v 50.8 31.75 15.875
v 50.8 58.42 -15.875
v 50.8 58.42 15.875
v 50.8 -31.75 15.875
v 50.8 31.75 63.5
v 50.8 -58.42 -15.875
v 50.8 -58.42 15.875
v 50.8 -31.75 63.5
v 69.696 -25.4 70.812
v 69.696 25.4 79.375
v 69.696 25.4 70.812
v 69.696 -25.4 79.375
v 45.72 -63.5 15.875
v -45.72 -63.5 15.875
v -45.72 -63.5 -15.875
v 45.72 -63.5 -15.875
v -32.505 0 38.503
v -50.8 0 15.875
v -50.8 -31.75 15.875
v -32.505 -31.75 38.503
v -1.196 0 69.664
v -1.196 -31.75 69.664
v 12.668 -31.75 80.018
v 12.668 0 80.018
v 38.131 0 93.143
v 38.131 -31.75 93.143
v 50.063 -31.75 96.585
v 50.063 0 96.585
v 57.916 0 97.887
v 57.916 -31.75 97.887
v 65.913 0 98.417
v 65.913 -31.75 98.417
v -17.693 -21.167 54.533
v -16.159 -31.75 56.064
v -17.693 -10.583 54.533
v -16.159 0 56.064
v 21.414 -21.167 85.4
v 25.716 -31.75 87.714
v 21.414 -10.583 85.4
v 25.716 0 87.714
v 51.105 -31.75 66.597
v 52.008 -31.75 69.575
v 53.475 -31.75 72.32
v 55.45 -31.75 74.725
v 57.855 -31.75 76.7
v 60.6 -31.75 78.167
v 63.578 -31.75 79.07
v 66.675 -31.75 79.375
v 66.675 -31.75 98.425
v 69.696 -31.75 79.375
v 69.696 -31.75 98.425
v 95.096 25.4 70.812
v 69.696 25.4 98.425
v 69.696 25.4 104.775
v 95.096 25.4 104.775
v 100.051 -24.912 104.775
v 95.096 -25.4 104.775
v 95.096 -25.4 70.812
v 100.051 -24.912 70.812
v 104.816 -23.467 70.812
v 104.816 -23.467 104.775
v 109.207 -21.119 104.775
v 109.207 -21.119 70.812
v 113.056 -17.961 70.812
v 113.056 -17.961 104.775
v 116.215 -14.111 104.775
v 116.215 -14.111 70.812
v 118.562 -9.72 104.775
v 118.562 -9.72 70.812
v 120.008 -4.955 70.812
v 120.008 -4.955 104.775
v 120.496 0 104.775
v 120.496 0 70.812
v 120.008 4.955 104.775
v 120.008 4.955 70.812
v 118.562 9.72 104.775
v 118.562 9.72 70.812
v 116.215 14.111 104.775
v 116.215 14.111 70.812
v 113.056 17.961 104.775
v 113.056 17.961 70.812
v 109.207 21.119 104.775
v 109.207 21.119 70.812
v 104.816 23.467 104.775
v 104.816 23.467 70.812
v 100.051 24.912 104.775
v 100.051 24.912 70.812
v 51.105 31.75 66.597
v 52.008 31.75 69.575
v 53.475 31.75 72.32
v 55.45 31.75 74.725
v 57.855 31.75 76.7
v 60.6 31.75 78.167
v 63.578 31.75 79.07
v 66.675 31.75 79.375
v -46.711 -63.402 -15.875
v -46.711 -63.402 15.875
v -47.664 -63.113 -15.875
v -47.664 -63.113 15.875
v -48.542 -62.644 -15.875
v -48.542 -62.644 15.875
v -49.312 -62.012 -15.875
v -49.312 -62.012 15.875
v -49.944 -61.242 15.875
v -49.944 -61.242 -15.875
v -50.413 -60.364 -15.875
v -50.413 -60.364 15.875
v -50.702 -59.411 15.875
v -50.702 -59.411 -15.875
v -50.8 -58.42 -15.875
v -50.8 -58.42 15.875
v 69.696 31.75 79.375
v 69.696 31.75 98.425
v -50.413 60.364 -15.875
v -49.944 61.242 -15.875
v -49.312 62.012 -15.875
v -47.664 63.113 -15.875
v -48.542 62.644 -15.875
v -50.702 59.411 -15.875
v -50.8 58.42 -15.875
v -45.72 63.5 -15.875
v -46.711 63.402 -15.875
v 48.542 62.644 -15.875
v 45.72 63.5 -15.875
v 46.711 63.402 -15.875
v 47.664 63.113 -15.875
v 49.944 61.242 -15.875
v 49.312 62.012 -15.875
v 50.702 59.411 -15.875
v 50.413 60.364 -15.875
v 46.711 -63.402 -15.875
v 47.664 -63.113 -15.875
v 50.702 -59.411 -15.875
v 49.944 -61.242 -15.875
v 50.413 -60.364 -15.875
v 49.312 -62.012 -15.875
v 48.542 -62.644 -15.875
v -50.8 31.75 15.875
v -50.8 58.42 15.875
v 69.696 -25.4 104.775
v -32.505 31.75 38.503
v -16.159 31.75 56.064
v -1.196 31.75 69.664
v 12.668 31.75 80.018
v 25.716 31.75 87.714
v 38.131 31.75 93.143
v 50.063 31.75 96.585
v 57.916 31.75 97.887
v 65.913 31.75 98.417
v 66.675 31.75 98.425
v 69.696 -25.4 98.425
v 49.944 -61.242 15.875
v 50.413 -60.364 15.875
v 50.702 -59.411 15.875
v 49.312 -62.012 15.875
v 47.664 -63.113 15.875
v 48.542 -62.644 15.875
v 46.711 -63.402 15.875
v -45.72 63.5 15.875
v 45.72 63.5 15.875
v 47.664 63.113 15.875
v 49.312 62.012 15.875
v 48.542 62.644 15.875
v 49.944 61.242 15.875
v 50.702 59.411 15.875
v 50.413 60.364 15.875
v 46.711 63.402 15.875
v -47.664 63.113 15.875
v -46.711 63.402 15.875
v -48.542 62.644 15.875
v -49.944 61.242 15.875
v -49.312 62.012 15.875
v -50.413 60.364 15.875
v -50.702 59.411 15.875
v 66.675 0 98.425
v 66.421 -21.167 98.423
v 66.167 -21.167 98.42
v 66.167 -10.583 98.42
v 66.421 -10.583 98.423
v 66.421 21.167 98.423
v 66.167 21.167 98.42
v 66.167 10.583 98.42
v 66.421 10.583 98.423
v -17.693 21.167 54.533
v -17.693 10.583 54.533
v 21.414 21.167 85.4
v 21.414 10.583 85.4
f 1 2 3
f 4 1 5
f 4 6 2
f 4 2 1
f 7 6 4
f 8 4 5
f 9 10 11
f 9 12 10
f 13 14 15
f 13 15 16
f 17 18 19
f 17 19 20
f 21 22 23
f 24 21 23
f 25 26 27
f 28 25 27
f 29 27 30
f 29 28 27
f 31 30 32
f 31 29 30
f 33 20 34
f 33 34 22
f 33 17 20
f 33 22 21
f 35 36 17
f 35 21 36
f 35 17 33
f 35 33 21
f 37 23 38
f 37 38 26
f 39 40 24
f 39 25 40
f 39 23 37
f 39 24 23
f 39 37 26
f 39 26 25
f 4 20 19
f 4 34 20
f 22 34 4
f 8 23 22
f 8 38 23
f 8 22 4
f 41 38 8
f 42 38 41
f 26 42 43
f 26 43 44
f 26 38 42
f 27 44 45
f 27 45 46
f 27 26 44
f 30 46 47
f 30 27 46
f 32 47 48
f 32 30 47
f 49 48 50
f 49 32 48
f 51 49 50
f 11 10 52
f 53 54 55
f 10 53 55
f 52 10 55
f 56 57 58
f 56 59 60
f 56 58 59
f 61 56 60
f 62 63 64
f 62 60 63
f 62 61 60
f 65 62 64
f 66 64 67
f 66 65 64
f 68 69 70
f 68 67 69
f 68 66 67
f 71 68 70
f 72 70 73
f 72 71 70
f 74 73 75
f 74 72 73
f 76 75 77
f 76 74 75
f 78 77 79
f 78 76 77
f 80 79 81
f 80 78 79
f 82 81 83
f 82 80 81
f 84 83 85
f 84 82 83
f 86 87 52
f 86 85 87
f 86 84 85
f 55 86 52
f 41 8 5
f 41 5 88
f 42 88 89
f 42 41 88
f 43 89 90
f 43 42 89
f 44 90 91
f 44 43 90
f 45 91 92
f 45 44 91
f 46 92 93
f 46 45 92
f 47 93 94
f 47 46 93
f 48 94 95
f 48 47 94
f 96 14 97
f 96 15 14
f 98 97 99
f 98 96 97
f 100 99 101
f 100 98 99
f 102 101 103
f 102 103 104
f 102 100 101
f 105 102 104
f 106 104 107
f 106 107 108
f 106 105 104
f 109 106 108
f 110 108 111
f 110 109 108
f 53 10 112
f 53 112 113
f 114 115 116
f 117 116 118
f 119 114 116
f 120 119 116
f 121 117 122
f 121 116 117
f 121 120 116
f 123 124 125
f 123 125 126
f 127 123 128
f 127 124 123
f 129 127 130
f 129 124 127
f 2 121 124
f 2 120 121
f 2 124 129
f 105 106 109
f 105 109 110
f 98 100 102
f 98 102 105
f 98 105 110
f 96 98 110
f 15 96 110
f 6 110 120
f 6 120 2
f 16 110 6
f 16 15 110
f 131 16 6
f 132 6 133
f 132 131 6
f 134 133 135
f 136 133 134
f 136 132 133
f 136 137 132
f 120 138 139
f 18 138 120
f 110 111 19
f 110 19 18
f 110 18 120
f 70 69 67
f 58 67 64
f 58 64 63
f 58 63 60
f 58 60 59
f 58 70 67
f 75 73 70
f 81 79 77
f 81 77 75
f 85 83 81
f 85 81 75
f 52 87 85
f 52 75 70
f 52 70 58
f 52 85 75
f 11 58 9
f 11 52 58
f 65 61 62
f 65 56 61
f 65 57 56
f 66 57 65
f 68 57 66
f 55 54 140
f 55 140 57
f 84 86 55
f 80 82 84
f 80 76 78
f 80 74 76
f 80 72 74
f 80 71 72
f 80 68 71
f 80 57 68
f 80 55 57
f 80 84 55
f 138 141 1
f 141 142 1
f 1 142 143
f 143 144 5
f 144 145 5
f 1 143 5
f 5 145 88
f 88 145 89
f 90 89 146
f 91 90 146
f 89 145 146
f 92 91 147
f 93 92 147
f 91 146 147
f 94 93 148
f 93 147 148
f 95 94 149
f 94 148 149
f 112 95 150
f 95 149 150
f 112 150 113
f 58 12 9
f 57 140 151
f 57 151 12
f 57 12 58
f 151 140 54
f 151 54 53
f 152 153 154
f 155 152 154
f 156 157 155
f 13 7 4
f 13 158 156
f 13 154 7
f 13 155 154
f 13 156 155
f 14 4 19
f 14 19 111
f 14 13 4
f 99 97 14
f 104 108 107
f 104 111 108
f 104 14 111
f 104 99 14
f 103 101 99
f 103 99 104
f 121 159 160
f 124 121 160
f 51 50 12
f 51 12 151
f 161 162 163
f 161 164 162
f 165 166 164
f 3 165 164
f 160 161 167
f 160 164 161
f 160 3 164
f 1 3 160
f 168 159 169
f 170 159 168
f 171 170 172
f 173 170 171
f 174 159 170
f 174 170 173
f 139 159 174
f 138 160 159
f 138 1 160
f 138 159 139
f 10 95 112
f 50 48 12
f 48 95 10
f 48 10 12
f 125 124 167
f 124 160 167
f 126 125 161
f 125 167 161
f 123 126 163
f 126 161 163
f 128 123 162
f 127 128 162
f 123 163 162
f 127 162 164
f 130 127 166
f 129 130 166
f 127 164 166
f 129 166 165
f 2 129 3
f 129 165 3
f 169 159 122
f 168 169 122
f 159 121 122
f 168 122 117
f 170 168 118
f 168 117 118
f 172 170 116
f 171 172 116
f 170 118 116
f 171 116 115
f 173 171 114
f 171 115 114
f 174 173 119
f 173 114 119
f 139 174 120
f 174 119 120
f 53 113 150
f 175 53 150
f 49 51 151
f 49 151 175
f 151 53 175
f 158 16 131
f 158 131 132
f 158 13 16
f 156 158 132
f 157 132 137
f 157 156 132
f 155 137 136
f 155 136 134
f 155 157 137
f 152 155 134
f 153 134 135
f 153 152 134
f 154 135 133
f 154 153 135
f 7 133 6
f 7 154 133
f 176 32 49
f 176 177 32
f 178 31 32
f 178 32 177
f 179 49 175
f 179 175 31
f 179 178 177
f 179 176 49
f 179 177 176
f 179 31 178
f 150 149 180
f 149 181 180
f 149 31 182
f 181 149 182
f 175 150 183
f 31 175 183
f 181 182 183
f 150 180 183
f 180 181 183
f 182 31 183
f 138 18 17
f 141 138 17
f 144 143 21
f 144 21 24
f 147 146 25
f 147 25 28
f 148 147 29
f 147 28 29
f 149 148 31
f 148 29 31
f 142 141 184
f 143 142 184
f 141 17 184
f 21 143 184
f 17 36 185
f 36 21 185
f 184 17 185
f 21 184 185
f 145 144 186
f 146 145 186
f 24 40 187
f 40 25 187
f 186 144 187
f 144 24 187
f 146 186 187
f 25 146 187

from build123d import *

# Parameters (mm, degrees)
F1_DEPTH = 63.5
F2_DEPTH = 31.75
F0_W     = 25.4
F0_H     = 8.5634328214
F3_DEPTH = 25.4
F5_R     = 5.08


with BuildPart() as f1:
    # F0 (on Front) → F1 (new body, symmetric)
    with BuildSketch(Plane.XZ):
        Polygon((50.8, -15.875), (50.8, 15.875), (31.75, 15.875), (-50.8, 15.875), (-50.8, -15.875), align=None)
    extrude(amount=F1_DEPTH, both=True)

    # F0 (on Front) → F2 (join, symmetric)
    with BuildSketch(Plane.XZ):
        with BuildLine():
            Line((-50.8, 15.875), (31.75, 15.875))
            Line((31.75, 15.875), (31.75, 63.5))
            ThreePointArc((31.75, 63.5), (41.7112794582, 87.9247473214), (65.9128221454, 98.4166824014))
            add(Edge.make_bspline(
                [(-50.8, 15.875), (-20.8947578711, 55.0768055935), (18.9205500182, 97.6768686264), (65.9128221454, 98.4166824014)],
                knots=[0, 0, 0, 0, 142.8073833678, 142.8073833678, 142.8073833678, 142.8073833678], degree=3))
        make_face()
        with BuildLine():
            Line((31.75, 15.875), (50.8, 15.875))
            Line((50.8, 15.875), (50.8, 63.5))
            ThreePointArc((50.8, 63.5), (55.4496798487, 74.7253201513), (66.675, 79.375))
            Line((66.675, 79.375), (69.6957821591, 79.375))
            Line((69.6957821591, 79.375), (69.6957821591, 98.425))
            Line((69.6957821591, 98.425), (66.675, 98.425))
            add(Edge.make_bspline(
                [(65.9128221454, 98.4166824014), (66.1666721422, 98.4206788398), (66.4207315707, 98.4234537508), (66.675, 98.425)],
                knots=[142.8073833678, 142.8073833678, 142.8073833678, 142.8073833678, 143.5788219934, 143.5788219934, 143.5788219934, 143.5788219934], degree=3))
            ThreePointArc((65.9128221454, 98.4166824014), (41.7112794582, 87.9247473214), (31.75, 63.5))
            Line((31.75, 63.5), (31.75, 15.875))
        make_face()
    extrude(amount=F2_DEPTH, both=True)

    # F0 (on Front) → F3 (join, symmetric)
    with BuildSketch(Plane.XZ):
        with Locations((82.3957821591, 75.0932835893)):
            Rectangle(F0_W, F0_H)
        Polygon((69.6957821591, 98.425), (69.6957821591, 79.375), (95.0957821591, 79.375), (95.0957821591, 104.775), (69.6957821591, 104.775), align=None)
    extrude(amount=F3_DEPTH, both=True)

    # F0 (on Front) → F4 (revolve)
    with BuildSketch(Plane.XZ):
        Polygon((95.0957821591, 104.775), (95.0957821591, 79.375), (95.0957821591, 70.8115671786), (120.4957821591, 70.8115671786), (120.4957821591, 104.775), align=None)
    revolve(axis=Axis((95.0957821591, 0, 87.7932835893), (0, 0, 1)))

    # F5
    f5_edges = [f1.edges().sort_by_distance(p)[0] for p in [
        (50.8, -63.5, 0),
        (-50.8, -63.5, 0),
        (-50.8, 63.5, 0),
        (50.8, 63.5, 0),
    ]]
    fillet(f5_edges, radius=F5_R)


solid = f1.part
